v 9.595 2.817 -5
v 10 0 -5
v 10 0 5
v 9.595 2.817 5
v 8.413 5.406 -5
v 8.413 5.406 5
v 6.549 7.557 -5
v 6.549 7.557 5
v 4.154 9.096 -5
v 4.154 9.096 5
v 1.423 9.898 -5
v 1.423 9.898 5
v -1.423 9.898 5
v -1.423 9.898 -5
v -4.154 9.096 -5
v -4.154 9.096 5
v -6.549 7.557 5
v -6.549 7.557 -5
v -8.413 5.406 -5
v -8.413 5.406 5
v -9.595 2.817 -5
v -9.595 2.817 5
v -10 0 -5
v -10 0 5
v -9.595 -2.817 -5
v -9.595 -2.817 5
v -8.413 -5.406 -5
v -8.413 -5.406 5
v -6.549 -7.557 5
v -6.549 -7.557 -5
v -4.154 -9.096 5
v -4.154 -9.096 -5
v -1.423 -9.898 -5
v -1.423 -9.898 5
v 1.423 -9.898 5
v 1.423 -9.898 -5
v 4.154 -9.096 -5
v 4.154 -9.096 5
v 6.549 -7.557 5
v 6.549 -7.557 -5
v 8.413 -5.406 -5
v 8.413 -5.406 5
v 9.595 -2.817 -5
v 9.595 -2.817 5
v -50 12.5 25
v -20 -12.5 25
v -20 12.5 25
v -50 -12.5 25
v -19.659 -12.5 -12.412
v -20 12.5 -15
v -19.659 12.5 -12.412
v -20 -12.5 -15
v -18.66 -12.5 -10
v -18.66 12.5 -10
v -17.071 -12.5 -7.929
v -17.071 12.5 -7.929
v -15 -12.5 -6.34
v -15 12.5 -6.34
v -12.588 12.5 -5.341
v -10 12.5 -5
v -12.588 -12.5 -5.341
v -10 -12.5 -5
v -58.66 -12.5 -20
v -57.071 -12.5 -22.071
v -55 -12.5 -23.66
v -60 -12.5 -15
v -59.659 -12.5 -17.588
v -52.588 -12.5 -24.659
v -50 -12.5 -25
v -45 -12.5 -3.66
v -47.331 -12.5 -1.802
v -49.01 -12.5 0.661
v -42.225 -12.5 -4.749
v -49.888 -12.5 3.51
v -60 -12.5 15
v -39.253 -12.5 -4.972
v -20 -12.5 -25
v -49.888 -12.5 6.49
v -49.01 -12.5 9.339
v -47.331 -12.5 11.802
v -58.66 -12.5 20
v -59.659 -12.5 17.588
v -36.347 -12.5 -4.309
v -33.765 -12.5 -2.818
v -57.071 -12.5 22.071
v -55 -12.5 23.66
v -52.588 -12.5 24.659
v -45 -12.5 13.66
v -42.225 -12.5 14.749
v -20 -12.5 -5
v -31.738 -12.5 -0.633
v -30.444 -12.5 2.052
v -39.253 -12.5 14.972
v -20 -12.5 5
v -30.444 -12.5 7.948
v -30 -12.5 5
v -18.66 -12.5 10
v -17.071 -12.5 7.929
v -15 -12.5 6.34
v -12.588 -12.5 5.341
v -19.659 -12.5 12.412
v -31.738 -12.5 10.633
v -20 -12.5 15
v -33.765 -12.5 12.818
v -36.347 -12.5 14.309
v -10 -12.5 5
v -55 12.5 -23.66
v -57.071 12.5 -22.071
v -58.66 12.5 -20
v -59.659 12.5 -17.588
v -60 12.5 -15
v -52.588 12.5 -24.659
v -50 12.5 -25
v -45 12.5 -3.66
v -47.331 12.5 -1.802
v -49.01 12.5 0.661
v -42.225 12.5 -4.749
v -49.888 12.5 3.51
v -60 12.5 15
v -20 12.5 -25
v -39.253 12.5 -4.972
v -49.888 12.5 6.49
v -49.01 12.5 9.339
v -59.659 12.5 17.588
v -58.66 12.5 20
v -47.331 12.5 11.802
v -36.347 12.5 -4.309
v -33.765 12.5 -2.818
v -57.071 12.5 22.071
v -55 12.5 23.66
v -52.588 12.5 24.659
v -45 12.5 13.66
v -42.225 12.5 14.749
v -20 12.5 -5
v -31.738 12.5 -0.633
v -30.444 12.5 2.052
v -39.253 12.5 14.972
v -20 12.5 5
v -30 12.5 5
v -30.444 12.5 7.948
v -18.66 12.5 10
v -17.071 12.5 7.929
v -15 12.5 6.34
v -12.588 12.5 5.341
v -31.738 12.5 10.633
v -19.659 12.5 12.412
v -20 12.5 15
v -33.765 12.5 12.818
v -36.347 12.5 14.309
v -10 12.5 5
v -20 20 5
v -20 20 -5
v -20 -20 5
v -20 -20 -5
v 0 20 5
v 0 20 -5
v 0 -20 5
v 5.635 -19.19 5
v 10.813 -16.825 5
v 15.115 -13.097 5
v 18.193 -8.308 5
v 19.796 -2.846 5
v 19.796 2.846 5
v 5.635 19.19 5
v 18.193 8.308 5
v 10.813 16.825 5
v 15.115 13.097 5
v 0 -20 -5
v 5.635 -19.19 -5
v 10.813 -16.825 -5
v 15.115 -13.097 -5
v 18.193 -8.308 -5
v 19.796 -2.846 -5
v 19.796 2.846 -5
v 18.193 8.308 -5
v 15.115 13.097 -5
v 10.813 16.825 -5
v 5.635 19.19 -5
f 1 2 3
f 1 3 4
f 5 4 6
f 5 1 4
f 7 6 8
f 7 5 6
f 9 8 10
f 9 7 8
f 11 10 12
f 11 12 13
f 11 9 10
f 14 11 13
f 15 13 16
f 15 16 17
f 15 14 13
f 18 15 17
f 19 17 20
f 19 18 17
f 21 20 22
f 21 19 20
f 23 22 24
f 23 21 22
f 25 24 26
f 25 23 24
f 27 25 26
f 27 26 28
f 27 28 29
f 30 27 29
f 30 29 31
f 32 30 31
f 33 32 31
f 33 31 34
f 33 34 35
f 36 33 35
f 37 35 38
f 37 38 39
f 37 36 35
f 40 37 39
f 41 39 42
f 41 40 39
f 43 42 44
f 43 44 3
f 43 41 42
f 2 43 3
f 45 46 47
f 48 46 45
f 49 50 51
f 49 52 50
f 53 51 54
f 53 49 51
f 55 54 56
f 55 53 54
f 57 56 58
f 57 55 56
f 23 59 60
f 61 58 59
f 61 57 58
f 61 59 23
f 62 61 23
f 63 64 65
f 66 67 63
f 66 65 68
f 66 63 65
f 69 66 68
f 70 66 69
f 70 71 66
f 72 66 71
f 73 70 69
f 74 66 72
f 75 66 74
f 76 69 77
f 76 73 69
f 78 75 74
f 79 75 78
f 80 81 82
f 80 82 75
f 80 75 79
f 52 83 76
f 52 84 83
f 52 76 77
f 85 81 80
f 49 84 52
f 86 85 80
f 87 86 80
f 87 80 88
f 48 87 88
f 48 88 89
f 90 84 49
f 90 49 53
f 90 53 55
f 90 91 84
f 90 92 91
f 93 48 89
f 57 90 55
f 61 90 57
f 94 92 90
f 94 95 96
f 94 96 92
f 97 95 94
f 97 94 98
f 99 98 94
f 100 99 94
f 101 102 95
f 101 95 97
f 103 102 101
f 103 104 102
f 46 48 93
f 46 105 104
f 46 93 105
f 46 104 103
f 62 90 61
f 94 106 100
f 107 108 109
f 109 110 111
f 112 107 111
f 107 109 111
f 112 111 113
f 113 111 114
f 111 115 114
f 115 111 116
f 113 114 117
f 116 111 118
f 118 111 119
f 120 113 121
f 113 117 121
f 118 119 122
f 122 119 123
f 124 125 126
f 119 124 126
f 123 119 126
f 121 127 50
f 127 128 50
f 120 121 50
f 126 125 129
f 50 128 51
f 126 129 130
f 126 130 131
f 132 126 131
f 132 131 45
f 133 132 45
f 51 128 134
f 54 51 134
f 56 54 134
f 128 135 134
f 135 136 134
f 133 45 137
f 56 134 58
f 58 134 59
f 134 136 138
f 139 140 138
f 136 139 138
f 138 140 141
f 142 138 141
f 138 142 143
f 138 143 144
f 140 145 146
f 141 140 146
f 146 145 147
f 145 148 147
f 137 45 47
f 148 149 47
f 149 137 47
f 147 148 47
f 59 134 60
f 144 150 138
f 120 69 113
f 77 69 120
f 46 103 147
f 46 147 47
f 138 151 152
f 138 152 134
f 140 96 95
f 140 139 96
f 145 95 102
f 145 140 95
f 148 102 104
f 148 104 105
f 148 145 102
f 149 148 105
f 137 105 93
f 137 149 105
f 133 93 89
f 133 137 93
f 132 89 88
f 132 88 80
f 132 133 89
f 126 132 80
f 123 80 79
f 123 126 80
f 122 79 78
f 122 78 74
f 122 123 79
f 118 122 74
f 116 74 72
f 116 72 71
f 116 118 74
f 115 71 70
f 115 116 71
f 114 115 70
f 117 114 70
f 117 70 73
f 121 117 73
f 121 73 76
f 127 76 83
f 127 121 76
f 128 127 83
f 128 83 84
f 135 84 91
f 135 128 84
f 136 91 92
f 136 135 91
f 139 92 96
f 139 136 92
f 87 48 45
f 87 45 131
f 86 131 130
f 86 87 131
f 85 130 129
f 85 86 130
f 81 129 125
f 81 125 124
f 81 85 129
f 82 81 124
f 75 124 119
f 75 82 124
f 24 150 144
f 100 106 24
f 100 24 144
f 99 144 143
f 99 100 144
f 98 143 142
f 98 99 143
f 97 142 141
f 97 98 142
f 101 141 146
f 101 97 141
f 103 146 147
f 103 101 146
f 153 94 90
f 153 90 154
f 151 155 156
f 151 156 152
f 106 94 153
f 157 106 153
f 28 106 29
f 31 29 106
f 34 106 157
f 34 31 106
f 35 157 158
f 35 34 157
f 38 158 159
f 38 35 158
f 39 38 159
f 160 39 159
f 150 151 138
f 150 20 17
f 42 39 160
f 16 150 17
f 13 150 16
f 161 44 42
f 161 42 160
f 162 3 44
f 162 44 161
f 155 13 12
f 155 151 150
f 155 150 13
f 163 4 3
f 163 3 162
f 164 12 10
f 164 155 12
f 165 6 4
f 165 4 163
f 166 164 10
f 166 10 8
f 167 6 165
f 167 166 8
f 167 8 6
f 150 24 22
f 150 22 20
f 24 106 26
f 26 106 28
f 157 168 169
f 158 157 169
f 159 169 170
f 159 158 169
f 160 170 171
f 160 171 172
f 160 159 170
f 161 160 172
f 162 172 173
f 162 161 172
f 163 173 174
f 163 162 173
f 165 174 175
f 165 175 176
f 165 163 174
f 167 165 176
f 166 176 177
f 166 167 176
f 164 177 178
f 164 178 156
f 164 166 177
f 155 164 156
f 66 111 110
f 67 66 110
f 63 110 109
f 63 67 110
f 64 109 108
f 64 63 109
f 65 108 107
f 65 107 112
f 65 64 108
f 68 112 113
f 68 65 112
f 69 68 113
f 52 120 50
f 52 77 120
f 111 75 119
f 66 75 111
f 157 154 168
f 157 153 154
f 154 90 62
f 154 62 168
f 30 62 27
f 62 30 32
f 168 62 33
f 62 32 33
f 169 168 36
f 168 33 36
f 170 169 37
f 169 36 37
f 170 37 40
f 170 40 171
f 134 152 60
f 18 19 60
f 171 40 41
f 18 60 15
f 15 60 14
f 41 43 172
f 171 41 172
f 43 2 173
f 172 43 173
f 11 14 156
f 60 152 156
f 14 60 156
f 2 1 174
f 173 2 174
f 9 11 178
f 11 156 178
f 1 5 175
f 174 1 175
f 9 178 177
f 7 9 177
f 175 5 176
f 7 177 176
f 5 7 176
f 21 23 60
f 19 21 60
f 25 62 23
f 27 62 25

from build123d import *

# Parameters (mm, degrees)
F0_R     = 10
F1_DEPTH = 5
F2_R     = 10
F3_DEPTH = 12.5


with BuildPart() as f1:
    # F0 (on Top) → F1 (new body, symmetric)
    with BuildSketch(Plane.XY):
        with BuildLine():
            Line((-20, -20), (0, -20))
            ThreePointArc((0, -20), (20, 0), (0, 20))
            Line((0, 20), (-20, 20))
            Line((-20, 20), (-20, -20))
        make_face()
        Circle(F0_R, mode=Mode.SUBTRACT)
    extrude(amount=F1_DEPTH, both=True)

    # F2 (on Front) → F3 (join, symmetric)
    with BuildSketch(Plane.XZ):
        with BuildLine():
            ThreePointArc((-10, 5), (-17.071068, 7.928932), (-20, 15))
            Line((-20, 15), (-20, 25))
            Line((-20, 25), (-50, 25))
            ThreePointArc((-50, 25), (-57.071068, 22.071068), (-60, 15))
            Line((-60, 15), (-60, -15))
            ThreePointArc((-60, -15), (-57.071068, -22.071068), (-50, -25))
            Line((-50, -25), (-20, -25))
            Line((-20, -25), (-20, -15))
            ThreePointArc((-20, -15), (-17.071068, -7.928932), (-10, -5))
            Line((-10, -5), (-20, -5))
            Line((-20, -5), (-20, 5))
            Line((-20, 5), (-10, 5))
        make_face()
        with Locations((-40, 5)):
            Circle(F2_R, mode=Mode.SUBTRACT)
    extrude(amount=F3_DEPTH, both=True)


solid = f1.part
